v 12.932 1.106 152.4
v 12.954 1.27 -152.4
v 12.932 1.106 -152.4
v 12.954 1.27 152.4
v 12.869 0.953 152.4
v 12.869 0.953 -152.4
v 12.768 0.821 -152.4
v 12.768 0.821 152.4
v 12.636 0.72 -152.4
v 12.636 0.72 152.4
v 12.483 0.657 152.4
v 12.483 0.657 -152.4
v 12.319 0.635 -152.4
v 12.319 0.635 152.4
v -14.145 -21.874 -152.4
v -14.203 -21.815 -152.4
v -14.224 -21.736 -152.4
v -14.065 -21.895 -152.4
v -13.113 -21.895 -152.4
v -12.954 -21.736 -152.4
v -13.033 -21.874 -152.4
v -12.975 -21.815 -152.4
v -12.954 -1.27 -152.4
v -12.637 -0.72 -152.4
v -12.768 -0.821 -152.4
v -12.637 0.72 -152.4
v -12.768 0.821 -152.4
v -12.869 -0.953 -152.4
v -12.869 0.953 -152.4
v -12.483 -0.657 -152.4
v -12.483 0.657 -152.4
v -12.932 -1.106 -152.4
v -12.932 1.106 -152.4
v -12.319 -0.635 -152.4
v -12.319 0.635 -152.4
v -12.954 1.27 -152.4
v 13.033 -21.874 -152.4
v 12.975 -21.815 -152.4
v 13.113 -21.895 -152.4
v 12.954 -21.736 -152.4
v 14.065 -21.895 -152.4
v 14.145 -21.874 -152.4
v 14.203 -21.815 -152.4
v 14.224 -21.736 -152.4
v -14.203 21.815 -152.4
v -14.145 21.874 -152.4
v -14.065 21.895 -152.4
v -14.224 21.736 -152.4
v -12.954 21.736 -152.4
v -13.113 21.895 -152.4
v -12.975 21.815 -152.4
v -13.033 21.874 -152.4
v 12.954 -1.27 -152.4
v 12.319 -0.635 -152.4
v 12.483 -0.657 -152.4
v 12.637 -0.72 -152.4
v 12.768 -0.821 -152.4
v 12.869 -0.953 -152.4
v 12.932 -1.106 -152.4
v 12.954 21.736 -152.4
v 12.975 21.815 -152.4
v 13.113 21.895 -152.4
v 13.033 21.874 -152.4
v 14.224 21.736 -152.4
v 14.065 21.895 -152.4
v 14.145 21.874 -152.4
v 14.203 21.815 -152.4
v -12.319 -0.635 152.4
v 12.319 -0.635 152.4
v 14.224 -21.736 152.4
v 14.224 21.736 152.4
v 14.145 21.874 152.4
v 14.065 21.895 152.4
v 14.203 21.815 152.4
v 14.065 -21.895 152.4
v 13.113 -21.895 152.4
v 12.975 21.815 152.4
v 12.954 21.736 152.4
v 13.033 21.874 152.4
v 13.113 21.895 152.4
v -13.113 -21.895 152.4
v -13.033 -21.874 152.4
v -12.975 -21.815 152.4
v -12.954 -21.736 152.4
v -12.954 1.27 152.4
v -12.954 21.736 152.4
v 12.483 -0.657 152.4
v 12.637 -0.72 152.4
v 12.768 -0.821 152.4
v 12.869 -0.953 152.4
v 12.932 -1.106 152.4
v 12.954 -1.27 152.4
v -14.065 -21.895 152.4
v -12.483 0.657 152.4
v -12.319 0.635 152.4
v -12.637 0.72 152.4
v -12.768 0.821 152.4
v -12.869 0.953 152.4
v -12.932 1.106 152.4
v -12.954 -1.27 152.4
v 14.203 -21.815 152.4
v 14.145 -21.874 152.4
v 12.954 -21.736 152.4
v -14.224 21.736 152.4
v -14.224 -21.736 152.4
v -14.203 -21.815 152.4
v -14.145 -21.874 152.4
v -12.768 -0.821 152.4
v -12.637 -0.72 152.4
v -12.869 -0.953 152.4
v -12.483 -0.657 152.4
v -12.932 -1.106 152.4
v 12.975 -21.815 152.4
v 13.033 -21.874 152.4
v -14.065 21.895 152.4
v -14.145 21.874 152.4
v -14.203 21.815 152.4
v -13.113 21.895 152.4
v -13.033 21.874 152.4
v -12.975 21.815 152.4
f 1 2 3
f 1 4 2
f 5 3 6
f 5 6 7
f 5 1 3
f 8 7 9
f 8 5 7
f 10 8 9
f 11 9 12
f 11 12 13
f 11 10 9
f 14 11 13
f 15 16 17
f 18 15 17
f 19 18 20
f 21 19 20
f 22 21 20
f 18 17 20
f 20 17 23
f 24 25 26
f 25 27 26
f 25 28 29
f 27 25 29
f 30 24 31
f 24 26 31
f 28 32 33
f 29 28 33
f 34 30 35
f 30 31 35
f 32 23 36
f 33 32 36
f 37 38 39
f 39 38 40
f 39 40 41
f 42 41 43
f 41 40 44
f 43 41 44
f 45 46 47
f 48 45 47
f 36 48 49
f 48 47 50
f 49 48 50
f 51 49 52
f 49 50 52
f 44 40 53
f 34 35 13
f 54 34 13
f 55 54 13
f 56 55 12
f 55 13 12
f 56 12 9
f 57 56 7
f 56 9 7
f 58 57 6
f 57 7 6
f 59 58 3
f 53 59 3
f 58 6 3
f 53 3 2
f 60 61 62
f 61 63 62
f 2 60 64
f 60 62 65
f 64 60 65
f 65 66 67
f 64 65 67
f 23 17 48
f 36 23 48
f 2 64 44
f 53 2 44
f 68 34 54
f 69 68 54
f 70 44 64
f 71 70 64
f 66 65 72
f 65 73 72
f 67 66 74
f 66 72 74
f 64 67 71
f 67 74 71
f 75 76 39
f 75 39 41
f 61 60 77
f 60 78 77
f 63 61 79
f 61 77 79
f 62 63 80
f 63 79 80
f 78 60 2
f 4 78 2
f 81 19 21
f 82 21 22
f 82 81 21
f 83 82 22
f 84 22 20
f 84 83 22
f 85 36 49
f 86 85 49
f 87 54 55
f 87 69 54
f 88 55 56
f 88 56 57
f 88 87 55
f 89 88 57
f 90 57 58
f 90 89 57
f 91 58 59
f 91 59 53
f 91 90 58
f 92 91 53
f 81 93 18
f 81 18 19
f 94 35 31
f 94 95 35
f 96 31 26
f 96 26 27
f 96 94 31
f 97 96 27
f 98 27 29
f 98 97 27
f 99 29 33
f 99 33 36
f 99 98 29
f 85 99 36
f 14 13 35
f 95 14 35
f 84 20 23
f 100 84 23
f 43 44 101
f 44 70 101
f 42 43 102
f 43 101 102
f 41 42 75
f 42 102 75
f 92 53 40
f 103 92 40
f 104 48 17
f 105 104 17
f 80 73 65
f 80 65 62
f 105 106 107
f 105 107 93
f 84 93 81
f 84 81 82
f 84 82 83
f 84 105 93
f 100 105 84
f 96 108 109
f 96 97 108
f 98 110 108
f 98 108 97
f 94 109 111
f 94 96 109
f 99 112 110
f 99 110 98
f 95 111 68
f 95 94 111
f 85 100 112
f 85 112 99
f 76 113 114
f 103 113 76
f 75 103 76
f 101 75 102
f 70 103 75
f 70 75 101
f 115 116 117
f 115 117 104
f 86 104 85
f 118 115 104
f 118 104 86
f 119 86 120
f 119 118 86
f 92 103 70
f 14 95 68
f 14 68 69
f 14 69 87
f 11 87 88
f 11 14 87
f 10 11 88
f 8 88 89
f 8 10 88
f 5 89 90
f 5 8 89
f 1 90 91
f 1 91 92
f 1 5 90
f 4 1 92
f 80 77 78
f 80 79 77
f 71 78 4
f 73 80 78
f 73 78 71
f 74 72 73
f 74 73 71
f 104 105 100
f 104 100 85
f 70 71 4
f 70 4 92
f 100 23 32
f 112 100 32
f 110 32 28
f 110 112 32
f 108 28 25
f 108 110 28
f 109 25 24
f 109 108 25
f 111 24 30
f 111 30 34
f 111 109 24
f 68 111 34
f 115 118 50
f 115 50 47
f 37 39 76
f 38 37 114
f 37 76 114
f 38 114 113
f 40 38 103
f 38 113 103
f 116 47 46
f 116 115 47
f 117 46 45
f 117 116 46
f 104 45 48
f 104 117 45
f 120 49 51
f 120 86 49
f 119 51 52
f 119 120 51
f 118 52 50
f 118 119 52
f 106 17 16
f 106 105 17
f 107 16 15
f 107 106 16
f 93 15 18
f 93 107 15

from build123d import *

# Parameters (mm, degrees)
BOSS_EXTRUDE1_DEPTH      = 152.4
BOSS_EXTRUDE1_DEPTH_BACK = 152.4
FILLET1_R                = 0.635
FILLET2_R                = 0.15875


with BuildPart() as part:
    # Sketch3 → Boss-Extrude1 (new, two sides: drawn at the far end of the back side and taken through both)
    with BuildSketch(Plane.XY.offset(-BOSS_EXTRUDE1_DEPTH_BACK)):
        Polygon((14.224, -21.8948), (14.224, 21.8948), (12.954, 21.8948), (12.954, 0.635), (-12.954, 0.635), (-12.954, 21.8948), (-14.224, 21.8948), (-14.224, -21.8948), (-12.954, -21.8948), (-12.954, -0.635), (12.954, -0.635), (12.954, -21.8948), align=None)
    extrude(amount=BOSS_EXTRUDE1_DEPTH + BOSS_EXTRUDE1_DEPTH_BACK)

    # Fillet1
    fillet1_edges = [part.edges().sort_by_distance(p)[0] for p in [
        (12.954, -0.635, 0),
        (-12.954, -0.635, 0),
        (-12.954, 0.635, 0),
        (12.954, 0.635, 0),
    ]]
    fillet(fillet1_edges, radius=FILLET1_R)

    # Fillet2
    fillet2_edges = [part.edges().sort_by_distance(p)[0] for p in [
        (12.954, -21.8948, 0),
        (-12.954, -21.8948, 0),
        (-14.224, -21.8948, 0),
        (-14.224, 21.8948, 0),
        (-12.954, 21.8948, 0),
        (12.954, 21.8948, 0),
        (14.224, 21.8948, 0),
        (14.224, -21.8948, 0),
    ]]
    fillet(fillet2_edges, radius=FILLET2_R)


solid = part.part
